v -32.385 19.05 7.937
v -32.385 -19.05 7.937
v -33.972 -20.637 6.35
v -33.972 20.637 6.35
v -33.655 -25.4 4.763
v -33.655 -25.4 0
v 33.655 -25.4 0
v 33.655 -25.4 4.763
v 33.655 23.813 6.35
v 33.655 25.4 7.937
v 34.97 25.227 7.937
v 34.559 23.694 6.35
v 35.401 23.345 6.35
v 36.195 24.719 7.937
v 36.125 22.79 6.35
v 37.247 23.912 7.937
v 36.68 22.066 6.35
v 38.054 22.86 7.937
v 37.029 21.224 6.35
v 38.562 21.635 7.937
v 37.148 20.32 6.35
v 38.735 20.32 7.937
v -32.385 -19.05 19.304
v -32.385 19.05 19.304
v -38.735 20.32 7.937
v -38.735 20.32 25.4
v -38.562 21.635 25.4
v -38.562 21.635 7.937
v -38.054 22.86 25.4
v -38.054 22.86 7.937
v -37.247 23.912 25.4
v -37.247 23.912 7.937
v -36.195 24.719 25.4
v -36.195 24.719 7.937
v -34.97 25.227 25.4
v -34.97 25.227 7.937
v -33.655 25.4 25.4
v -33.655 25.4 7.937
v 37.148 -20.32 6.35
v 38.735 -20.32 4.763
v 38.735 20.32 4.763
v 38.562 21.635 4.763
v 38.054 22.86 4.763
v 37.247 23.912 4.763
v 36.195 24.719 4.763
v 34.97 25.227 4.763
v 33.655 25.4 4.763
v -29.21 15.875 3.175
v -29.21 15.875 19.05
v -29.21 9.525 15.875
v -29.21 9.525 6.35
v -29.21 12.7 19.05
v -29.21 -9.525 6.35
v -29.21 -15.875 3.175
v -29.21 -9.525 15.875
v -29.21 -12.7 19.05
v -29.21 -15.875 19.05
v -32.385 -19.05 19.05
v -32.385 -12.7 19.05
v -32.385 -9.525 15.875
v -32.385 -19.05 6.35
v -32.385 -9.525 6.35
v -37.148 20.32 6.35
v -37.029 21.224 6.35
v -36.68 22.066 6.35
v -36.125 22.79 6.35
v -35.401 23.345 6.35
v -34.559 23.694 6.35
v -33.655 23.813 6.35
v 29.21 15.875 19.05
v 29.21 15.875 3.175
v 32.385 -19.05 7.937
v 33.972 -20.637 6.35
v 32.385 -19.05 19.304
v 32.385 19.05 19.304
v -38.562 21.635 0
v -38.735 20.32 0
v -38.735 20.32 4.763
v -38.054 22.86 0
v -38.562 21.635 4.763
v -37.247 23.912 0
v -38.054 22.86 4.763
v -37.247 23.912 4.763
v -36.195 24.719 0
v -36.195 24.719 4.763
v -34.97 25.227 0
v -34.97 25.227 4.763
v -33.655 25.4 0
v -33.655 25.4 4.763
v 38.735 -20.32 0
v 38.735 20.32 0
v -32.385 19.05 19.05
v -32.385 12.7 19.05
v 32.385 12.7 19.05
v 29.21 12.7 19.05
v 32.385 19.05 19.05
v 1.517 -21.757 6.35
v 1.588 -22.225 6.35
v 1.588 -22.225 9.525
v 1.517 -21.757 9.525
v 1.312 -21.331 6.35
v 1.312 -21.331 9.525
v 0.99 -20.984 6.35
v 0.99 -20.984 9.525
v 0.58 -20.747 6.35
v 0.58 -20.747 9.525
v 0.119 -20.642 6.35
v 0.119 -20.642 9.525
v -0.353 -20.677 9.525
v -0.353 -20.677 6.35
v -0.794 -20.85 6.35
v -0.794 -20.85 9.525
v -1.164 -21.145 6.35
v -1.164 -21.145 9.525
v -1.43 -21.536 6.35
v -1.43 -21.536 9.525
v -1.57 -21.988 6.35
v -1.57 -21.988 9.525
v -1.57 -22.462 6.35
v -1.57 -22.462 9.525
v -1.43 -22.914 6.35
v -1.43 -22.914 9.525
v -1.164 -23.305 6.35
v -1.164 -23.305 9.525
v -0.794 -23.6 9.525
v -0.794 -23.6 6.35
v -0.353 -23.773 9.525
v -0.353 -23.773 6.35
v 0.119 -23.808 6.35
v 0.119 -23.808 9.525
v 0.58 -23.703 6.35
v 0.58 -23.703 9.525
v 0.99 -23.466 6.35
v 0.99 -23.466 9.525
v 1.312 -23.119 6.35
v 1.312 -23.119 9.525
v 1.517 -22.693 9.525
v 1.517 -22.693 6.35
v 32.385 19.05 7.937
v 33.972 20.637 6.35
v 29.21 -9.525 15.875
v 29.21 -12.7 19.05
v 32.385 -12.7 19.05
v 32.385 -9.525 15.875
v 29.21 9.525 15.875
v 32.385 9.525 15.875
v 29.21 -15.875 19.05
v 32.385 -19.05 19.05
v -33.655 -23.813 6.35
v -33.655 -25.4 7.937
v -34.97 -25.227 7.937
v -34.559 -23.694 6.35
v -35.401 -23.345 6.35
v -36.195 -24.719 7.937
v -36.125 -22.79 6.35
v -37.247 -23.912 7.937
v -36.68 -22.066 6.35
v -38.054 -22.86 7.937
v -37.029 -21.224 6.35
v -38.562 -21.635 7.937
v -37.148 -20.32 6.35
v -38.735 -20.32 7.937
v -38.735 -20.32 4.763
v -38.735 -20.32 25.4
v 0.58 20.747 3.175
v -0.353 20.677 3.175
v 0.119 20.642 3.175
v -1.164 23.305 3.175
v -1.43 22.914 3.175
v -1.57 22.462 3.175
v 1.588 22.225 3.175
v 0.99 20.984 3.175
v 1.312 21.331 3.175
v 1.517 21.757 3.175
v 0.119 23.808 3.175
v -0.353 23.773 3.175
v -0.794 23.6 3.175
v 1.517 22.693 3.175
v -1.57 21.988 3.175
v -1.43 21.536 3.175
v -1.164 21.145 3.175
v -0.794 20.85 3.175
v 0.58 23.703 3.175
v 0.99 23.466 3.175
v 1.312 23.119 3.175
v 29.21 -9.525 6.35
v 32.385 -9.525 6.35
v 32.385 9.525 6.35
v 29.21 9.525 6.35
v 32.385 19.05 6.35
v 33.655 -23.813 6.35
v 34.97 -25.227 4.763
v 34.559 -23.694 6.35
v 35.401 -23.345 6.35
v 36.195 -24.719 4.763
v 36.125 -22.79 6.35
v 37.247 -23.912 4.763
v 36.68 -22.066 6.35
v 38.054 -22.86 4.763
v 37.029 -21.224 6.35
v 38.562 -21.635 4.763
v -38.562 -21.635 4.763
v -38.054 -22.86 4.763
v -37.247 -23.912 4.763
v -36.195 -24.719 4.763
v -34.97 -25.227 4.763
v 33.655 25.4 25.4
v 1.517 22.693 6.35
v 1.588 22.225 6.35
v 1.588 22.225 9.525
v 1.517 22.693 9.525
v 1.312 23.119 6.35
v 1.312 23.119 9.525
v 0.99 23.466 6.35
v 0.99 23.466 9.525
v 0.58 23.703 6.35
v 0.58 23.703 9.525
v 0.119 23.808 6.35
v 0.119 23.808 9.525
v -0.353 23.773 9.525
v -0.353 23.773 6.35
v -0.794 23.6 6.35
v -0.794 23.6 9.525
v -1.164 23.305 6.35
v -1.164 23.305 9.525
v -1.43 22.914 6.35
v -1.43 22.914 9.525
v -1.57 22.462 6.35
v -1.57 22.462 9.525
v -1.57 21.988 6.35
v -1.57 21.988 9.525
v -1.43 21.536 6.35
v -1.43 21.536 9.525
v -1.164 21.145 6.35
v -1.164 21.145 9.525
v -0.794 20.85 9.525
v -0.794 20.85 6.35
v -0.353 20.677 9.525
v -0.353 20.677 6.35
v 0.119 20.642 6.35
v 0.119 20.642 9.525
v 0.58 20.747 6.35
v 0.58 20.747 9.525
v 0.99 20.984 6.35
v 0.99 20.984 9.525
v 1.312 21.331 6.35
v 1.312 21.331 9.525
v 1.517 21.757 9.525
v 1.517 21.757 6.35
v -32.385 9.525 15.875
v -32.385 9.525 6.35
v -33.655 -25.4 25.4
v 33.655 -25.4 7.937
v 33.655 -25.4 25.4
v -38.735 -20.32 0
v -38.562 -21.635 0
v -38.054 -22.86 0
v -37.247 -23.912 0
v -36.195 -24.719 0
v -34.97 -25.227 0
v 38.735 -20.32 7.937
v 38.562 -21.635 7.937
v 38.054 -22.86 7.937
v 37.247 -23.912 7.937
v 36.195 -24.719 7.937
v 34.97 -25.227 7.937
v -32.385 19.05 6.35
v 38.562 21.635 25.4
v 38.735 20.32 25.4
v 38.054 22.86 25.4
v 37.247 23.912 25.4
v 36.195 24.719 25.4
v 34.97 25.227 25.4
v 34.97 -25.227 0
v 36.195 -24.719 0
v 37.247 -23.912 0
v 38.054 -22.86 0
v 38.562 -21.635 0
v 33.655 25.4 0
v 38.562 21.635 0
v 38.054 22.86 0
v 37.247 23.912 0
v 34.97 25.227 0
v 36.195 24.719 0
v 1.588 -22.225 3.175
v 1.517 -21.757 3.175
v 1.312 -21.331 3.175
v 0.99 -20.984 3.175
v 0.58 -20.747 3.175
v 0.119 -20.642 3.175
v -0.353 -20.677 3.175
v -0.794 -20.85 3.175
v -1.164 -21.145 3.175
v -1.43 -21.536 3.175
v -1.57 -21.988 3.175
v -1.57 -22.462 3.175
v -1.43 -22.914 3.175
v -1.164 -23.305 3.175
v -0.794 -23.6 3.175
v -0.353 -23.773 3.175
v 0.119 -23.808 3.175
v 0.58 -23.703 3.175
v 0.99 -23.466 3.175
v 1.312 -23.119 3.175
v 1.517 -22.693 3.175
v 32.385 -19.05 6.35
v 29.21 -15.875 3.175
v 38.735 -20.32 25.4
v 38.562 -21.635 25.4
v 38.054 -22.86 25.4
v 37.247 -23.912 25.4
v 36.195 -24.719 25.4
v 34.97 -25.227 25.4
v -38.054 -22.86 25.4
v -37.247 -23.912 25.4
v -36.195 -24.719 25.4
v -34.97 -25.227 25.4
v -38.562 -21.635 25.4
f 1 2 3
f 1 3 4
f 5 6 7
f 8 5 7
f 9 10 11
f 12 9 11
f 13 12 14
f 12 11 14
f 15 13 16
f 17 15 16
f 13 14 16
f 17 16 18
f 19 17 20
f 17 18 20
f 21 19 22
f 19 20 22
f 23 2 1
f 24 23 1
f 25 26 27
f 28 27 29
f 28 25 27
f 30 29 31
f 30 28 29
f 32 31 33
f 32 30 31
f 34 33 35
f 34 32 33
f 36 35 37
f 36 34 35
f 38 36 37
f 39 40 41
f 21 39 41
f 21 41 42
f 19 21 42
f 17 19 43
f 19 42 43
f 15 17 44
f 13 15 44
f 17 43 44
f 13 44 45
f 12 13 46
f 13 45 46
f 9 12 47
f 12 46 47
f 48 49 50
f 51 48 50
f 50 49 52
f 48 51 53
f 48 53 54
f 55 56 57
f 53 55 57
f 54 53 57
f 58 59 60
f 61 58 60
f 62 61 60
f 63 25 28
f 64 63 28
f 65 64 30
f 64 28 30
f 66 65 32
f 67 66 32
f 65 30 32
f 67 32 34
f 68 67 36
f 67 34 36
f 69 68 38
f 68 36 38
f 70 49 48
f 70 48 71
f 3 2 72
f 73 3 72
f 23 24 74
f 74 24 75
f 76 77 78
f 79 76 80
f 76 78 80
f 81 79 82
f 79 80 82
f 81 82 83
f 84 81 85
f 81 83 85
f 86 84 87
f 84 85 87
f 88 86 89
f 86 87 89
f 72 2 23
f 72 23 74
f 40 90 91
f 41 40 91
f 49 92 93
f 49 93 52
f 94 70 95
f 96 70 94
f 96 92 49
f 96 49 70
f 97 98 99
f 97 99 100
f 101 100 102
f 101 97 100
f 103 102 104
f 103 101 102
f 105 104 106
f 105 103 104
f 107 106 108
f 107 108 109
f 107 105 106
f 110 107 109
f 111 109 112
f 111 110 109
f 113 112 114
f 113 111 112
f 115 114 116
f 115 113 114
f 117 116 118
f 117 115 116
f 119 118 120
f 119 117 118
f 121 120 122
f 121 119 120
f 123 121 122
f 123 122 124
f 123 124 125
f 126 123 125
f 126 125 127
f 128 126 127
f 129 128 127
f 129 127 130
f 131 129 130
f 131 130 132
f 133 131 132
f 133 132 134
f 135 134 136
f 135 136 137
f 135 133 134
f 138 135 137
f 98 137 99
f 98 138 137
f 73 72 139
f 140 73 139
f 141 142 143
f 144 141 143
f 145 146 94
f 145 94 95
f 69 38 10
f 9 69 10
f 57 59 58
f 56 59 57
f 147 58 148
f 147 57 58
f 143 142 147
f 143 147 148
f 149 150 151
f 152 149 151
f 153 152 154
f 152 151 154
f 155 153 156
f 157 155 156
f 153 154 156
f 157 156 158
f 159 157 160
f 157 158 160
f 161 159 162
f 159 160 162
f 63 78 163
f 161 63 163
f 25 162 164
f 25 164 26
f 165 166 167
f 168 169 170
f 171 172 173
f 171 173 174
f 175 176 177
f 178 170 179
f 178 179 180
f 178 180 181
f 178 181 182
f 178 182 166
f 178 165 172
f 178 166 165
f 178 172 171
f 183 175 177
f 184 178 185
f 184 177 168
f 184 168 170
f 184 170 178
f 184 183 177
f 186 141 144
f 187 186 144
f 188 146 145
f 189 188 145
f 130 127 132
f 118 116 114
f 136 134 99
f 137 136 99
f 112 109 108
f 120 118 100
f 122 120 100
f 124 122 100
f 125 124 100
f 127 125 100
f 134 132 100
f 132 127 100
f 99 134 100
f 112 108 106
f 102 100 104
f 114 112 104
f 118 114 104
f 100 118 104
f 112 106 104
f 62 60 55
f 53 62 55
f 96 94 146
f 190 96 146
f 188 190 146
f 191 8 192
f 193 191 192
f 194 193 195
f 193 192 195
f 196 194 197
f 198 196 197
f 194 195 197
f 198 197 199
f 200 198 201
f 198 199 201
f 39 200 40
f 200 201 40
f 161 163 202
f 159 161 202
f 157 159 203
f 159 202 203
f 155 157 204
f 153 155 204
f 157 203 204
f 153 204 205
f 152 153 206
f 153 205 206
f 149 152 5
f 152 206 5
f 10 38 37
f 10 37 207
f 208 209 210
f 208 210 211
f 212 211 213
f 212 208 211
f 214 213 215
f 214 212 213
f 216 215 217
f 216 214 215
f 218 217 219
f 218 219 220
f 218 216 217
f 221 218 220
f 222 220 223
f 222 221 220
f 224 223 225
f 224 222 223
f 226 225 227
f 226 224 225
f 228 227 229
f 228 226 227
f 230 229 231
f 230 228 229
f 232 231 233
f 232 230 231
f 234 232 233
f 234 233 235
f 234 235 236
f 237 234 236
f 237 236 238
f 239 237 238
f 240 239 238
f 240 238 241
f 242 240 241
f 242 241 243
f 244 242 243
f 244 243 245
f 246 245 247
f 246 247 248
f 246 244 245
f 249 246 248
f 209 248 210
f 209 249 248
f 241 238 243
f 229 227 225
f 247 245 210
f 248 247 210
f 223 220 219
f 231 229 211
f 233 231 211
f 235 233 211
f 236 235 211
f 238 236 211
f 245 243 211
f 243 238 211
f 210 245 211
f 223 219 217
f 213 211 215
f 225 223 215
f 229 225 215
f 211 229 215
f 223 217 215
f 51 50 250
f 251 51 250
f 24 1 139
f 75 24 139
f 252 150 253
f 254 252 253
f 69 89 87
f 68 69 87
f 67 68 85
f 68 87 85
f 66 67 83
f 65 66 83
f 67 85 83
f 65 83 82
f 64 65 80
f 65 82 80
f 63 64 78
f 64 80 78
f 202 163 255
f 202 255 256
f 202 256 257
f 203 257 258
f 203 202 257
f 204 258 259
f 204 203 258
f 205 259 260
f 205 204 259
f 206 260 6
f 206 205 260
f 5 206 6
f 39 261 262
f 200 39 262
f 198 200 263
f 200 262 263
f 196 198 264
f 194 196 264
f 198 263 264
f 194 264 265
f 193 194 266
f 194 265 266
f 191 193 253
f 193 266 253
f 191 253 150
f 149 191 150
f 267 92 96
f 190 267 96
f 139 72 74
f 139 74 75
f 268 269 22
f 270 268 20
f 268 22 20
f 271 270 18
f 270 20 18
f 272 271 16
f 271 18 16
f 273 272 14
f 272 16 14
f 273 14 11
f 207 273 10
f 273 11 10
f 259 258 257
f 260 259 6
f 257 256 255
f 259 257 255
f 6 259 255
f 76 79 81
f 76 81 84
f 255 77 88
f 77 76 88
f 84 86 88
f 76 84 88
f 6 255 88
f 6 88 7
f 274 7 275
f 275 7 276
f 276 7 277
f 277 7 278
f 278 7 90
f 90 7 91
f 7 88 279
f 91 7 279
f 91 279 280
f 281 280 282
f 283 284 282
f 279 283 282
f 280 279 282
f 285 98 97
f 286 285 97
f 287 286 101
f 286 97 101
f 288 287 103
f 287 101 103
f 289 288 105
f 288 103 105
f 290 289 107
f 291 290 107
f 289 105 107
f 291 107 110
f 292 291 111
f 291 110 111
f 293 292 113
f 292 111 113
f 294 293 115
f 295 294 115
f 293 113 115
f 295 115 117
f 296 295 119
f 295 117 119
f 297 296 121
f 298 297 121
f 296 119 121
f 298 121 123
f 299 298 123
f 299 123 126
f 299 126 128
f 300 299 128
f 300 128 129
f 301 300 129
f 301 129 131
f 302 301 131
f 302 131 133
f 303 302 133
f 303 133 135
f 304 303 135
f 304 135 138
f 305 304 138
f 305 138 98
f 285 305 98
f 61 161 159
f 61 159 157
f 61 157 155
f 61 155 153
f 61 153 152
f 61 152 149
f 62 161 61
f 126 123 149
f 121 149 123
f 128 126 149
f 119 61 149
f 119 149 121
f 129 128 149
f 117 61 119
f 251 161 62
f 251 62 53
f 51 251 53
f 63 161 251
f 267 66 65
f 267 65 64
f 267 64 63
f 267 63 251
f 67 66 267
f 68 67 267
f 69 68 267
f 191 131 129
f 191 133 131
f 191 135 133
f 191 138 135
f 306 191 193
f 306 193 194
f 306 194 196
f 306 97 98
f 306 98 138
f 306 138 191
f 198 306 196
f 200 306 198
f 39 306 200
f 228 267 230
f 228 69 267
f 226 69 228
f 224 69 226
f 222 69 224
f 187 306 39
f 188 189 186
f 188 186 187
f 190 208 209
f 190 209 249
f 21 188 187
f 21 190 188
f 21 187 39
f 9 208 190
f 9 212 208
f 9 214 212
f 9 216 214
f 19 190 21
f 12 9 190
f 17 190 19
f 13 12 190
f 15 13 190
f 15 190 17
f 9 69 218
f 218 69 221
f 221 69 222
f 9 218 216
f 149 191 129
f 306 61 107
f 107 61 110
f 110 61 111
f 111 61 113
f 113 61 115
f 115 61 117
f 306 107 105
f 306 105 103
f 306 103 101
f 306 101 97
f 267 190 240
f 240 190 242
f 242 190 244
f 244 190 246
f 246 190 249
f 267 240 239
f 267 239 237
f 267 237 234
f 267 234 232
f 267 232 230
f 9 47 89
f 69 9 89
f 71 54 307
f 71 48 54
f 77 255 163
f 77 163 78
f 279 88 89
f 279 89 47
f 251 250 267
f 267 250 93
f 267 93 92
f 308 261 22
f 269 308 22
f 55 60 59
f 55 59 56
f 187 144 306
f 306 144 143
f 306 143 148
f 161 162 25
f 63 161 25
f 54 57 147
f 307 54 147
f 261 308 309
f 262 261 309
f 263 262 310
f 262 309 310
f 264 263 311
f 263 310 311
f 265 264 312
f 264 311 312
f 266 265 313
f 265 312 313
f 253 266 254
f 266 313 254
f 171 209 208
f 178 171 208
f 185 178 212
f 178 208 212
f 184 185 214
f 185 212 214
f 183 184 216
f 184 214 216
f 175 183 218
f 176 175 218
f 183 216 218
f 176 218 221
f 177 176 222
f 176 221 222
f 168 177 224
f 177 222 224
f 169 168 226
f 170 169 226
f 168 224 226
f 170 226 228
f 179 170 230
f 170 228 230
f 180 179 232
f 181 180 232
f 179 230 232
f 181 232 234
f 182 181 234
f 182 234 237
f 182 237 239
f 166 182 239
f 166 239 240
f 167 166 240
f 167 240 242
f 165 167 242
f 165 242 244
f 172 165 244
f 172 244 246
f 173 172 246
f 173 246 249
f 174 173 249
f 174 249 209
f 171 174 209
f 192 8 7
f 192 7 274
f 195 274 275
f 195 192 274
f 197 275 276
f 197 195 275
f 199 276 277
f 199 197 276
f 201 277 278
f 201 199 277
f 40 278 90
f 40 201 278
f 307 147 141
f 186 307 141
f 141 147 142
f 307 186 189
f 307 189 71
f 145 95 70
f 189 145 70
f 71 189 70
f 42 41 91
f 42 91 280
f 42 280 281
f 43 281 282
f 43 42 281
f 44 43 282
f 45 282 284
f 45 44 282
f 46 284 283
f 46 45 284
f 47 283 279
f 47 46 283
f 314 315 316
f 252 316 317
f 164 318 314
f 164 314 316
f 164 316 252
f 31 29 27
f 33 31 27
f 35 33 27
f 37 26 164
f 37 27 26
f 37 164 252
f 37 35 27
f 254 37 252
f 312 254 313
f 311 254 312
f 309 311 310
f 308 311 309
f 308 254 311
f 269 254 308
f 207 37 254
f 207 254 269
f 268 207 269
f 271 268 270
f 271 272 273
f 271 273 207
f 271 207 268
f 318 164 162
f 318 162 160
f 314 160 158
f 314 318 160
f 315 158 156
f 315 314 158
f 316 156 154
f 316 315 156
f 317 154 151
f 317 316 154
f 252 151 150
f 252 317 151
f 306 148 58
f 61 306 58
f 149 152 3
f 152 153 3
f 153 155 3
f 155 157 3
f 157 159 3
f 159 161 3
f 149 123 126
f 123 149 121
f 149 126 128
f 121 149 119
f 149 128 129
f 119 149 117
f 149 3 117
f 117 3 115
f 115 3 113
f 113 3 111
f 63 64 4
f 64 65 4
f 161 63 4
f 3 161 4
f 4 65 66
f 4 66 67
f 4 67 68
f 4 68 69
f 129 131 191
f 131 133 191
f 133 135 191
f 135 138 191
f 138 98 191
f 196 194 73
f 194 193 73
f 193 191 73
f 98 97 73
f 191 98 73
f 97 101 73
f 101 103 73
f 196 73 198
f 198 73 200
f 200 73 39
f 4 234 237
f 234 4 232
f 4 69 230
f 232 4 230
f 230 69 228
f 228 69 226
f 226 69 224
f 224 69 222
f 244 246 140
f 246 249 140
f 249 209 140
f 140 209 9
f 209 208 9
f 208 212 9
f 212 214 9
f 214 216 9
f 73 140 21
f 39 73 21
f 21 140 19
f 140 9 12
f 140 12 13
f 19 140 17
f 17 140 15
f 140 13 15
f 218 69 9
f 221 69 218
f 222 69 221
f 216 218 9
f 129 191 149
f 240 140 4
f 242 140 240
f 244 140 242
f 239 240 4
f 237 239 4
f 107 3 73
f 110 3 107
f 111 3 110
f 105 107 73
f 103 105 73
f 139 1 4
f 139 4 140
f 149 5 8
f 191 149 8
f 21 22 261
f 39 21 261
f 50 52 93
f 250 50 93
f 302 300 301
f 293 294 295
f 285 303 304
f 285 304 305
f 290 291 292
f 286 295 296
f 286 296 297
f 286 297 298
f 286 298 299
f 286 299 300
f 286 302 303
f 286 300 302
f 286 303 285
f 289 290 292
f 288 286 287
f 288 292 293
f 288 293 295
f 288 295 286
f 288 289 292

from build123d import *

# Parameters (mm, degrees)
F0_W       = 77.47
F0_H       = 50.8
F1_DEPTH   = 19.05
F2_W       = 58.42
F2_H       = 6.35
F2_H_2     = 19.05
F3_DEPTH   = 15.875
F2_R       = 1.5875
F2_W_2     = 6.35
F4_DEPTH   = 12.7
F2_W_3     = 3.175
F5_DEPTH   = 12.7
F6_SIZE    = 3.175
F7_W       = 77.47
F7_H       = 50.8
F7_W_2     = 64.77
F7_H_2     = 38.1
F8_DEPTH   = 19.05
F9_W       = 77.47
F9_H       = 50.8
F9_W_2     = 64.77
F9_H_2     = 38.1
F10_DEPTH  = 6.096
F11_R      = 5.08
F11_2_R    = 5.08
F12_DEPTH  = 15.875
F13_SIZE   = 1.58749
F13_2_SIZE = 1.58749
F14_R      = 1.5875
F15_DEPTH  = 3.175


# Not quite as in the source:
# - a fillet or chamfer is up to 0.001 mm smaller than in the source, because OpenCascade refuses the exact size


with BuildPart() as f1:
    # F0 (on Top) → F1 (new body)
    with BuildSketch(Plane.XY):
        Rectangle(F0_W, F0_H)
    extrude(amount=F1_DEPTH)

    # F2 (on face) → F3 (cut)
    with BuildSketch(Plane.XY.offset(19.05)):
        with Locations((0, -12.7)):
            Rectangle(F2_W, F2_H)
        Rectangle(F2_W, F2_H_2)
        with Locations((0, 12.7)):
            Rectangle(F2_W, F2_H)
    extrude(amount=-F3_DEPTH, mode=Mode.SUBTRACT)

    # F2 (on face) → F4 (cut)
    with BuildSketch(Plane.XY.offset(19.05)):
        Polygon((38.735, -9.525), (32.385, -9.525), (32.385, -19.05), (-32.385, -19.05), (-32.385, -9.525), (-38.735, -9.525), (-38.735, -25.4), (38.735, -25.4), align=None)
        with Locations((0, -22.225)):
            Circle(F2_R, mode=Mode.SUBTRACT)
        Polygon((32.385, 19.05), (32.385, 9.525), (38.735, 9.525), (38.735, 25.4), (-38.735, 25.4), (-38.735, 9.525), (-32.385, 9.525), (-32.385, 19.05), align=None)
        with Locations((0, 22.225)):
            Circle(F2_R, mode=Mode.SUBTRACT)
        with Locations((-35.56, 0)):
            Rectangle(F2_W_2, F2_H_2)
        with Locations((35.56, 0)):
            Rectangle(F2_W_2, F2_H_2)
        with Locations((0, 22.225)):
            Circle(F2_R)
        with Locations((0, -22.225)):
            Circle(F2_R)
    extrude(amount=-F4_DEPTH, mode=Mode.SUBTRACT)

    # F2 (on face) → F5 (cut)
    with BuildSketch(Plane.XY.offset(19.05)):
        with Locations((-35.56, 0)):
            Rectangle(F2_W_2, F2_H_2)
        with Locations((-30.7975, 0)):
            Rectangle(F2_W_3, F2_H_2)
        with Locations((30.7975, 0)):
            Rectangle(F2_W_3, F2_H_2)
        with Locations((35.56, 0)):
            Rectangle(F2_W_2, F2_H_2)
    extrude(amount=-F5_DEPTH, mode=Mode.SUBTRACT)

    # F6
    f6_edges = [f1.edges().sort_by_distance(p)[0] for p in [
        (-30.7975, 9.525, 19.05),
        (-30.7975, -9.525, 19.05),
        (30.7975, 9.525, 19.05),
        (30.7975, -9.525, 19.05),
    ]]
    chamfer(f6_edges, length=F6_SIZE)

    # F11
    f11_edges = [f1.edges().sort_by_distance(p)[0] for p in [
        (-38.735, 25.4, 3.175),
        (-38.735, -25.4, 3.175),
        (38.735, 25.4, 3.175),
        (38.735, -25.4, 3.175),
    ]]
    fillet(f11_edges, radius=F11_R)

    # F2 (on face) → F12 (cut)
    with BuildSketch(Plane.XY.offset(19.05)):
        with Locations((0, 22.225)):
            Circle(F2_R)
        with Locations((0, -22.225)):
            Circle(F2_R)
    extrude(amount=-F12_DEPTH, mode=Mode.SUBTRACT)

    # F13 (size 1.5875 in the source; OpenCascade refuses exactly that, so slightly less here)
    f13_edges = [f1.edges().sort_by_distance(p)[0] for p in [
        (0, 25.4, 6.35),
        (-38.735, 0, 6.35),
        (38.735, 0, 6.35),
        (37.247102, 23.912102, 6.35),
        (37.247102, -23.912102, 6.35),
        (0, -25.4, 6.35),
        (-37.247102, 23.912102, 6.35),
        (-37.247102, -23.912102, 6.35),
    ]]
    chamfer(f13_edges, length=F13_SIZE)


with BuildPart() as f8:
    # F7 (on face) → F8 (new body)
    with BuildSketch(Plane.XY.offset(6.35)):
        Rectangle(F7_W, F7_H)
        Rectangle(F7_W_2, F7_H_2, mode=Mode.SUBTRACT)
    extrude(amount=F8_DEPTH)

    # F9 (on face) → F10 (join)
    with BuildSketch(Plane.XY.offset(25.4)):
        Rectangle(F9_W, F9_H)
        Rectangle(F9_W_2, F9_H_2, mode=Mode.SUBTRACT)
        Rectangle(F9_W_2, F9_H_2)
    extrude(amount=-F10_DEPTH)

    # F11#2
    f11_2_edges = [f8.edges().sort_by_distance(p)[0] for p in [
        (-38.735, 25.4, 15.875),
        (-38.735, -25.4, 15.875),
        (38.735, 25.4, 15.875),
        (38.735, -25.4, 15.875),
    ]]
    fillet(f11_2_edges, radius=F11_2_R)

    # F13#2 (size 1.5875 in the source; OpenCascade refuses exactly that, so slightly less here)
    f13_2_edges = [f8.edges().sort_by_distance(p)[0] for p in [
        (0, 25.4, 6.35),
        (-38.735, 0, 6.35),
        (0, 19.05, 6.35),
        (-32.385, 0, 6.35),
        (0, -19.05, 6.35),
        (32.385, 0, 6.35),
        (38.735, 0, 6.35),
        (37.247102, 23.912102, 6.35),
        (37.247102, -23.912102, 6.35),
        (0, -25.4, 6.35),
        (-37.247102, 23.912102, 6.35),
        (-37.247102, -23.912102, 6.35),
    ]]
    chamfer(f13_2_edges, length=F13_2_SIZE)

    # F14 (on face) → F15 (cut)
    with BuildSketch(Plane.XY.offset(6.35)):
        with Locations((0, 22.225)):
            Circle(F14_R)
        with Locations((0, -22.225)):
            Circle(F14_R)
    extrude(amount=F15_DEPTH, mode=Mode.SUBTRACT)


solid = Compound([f1.part, f8.part])
